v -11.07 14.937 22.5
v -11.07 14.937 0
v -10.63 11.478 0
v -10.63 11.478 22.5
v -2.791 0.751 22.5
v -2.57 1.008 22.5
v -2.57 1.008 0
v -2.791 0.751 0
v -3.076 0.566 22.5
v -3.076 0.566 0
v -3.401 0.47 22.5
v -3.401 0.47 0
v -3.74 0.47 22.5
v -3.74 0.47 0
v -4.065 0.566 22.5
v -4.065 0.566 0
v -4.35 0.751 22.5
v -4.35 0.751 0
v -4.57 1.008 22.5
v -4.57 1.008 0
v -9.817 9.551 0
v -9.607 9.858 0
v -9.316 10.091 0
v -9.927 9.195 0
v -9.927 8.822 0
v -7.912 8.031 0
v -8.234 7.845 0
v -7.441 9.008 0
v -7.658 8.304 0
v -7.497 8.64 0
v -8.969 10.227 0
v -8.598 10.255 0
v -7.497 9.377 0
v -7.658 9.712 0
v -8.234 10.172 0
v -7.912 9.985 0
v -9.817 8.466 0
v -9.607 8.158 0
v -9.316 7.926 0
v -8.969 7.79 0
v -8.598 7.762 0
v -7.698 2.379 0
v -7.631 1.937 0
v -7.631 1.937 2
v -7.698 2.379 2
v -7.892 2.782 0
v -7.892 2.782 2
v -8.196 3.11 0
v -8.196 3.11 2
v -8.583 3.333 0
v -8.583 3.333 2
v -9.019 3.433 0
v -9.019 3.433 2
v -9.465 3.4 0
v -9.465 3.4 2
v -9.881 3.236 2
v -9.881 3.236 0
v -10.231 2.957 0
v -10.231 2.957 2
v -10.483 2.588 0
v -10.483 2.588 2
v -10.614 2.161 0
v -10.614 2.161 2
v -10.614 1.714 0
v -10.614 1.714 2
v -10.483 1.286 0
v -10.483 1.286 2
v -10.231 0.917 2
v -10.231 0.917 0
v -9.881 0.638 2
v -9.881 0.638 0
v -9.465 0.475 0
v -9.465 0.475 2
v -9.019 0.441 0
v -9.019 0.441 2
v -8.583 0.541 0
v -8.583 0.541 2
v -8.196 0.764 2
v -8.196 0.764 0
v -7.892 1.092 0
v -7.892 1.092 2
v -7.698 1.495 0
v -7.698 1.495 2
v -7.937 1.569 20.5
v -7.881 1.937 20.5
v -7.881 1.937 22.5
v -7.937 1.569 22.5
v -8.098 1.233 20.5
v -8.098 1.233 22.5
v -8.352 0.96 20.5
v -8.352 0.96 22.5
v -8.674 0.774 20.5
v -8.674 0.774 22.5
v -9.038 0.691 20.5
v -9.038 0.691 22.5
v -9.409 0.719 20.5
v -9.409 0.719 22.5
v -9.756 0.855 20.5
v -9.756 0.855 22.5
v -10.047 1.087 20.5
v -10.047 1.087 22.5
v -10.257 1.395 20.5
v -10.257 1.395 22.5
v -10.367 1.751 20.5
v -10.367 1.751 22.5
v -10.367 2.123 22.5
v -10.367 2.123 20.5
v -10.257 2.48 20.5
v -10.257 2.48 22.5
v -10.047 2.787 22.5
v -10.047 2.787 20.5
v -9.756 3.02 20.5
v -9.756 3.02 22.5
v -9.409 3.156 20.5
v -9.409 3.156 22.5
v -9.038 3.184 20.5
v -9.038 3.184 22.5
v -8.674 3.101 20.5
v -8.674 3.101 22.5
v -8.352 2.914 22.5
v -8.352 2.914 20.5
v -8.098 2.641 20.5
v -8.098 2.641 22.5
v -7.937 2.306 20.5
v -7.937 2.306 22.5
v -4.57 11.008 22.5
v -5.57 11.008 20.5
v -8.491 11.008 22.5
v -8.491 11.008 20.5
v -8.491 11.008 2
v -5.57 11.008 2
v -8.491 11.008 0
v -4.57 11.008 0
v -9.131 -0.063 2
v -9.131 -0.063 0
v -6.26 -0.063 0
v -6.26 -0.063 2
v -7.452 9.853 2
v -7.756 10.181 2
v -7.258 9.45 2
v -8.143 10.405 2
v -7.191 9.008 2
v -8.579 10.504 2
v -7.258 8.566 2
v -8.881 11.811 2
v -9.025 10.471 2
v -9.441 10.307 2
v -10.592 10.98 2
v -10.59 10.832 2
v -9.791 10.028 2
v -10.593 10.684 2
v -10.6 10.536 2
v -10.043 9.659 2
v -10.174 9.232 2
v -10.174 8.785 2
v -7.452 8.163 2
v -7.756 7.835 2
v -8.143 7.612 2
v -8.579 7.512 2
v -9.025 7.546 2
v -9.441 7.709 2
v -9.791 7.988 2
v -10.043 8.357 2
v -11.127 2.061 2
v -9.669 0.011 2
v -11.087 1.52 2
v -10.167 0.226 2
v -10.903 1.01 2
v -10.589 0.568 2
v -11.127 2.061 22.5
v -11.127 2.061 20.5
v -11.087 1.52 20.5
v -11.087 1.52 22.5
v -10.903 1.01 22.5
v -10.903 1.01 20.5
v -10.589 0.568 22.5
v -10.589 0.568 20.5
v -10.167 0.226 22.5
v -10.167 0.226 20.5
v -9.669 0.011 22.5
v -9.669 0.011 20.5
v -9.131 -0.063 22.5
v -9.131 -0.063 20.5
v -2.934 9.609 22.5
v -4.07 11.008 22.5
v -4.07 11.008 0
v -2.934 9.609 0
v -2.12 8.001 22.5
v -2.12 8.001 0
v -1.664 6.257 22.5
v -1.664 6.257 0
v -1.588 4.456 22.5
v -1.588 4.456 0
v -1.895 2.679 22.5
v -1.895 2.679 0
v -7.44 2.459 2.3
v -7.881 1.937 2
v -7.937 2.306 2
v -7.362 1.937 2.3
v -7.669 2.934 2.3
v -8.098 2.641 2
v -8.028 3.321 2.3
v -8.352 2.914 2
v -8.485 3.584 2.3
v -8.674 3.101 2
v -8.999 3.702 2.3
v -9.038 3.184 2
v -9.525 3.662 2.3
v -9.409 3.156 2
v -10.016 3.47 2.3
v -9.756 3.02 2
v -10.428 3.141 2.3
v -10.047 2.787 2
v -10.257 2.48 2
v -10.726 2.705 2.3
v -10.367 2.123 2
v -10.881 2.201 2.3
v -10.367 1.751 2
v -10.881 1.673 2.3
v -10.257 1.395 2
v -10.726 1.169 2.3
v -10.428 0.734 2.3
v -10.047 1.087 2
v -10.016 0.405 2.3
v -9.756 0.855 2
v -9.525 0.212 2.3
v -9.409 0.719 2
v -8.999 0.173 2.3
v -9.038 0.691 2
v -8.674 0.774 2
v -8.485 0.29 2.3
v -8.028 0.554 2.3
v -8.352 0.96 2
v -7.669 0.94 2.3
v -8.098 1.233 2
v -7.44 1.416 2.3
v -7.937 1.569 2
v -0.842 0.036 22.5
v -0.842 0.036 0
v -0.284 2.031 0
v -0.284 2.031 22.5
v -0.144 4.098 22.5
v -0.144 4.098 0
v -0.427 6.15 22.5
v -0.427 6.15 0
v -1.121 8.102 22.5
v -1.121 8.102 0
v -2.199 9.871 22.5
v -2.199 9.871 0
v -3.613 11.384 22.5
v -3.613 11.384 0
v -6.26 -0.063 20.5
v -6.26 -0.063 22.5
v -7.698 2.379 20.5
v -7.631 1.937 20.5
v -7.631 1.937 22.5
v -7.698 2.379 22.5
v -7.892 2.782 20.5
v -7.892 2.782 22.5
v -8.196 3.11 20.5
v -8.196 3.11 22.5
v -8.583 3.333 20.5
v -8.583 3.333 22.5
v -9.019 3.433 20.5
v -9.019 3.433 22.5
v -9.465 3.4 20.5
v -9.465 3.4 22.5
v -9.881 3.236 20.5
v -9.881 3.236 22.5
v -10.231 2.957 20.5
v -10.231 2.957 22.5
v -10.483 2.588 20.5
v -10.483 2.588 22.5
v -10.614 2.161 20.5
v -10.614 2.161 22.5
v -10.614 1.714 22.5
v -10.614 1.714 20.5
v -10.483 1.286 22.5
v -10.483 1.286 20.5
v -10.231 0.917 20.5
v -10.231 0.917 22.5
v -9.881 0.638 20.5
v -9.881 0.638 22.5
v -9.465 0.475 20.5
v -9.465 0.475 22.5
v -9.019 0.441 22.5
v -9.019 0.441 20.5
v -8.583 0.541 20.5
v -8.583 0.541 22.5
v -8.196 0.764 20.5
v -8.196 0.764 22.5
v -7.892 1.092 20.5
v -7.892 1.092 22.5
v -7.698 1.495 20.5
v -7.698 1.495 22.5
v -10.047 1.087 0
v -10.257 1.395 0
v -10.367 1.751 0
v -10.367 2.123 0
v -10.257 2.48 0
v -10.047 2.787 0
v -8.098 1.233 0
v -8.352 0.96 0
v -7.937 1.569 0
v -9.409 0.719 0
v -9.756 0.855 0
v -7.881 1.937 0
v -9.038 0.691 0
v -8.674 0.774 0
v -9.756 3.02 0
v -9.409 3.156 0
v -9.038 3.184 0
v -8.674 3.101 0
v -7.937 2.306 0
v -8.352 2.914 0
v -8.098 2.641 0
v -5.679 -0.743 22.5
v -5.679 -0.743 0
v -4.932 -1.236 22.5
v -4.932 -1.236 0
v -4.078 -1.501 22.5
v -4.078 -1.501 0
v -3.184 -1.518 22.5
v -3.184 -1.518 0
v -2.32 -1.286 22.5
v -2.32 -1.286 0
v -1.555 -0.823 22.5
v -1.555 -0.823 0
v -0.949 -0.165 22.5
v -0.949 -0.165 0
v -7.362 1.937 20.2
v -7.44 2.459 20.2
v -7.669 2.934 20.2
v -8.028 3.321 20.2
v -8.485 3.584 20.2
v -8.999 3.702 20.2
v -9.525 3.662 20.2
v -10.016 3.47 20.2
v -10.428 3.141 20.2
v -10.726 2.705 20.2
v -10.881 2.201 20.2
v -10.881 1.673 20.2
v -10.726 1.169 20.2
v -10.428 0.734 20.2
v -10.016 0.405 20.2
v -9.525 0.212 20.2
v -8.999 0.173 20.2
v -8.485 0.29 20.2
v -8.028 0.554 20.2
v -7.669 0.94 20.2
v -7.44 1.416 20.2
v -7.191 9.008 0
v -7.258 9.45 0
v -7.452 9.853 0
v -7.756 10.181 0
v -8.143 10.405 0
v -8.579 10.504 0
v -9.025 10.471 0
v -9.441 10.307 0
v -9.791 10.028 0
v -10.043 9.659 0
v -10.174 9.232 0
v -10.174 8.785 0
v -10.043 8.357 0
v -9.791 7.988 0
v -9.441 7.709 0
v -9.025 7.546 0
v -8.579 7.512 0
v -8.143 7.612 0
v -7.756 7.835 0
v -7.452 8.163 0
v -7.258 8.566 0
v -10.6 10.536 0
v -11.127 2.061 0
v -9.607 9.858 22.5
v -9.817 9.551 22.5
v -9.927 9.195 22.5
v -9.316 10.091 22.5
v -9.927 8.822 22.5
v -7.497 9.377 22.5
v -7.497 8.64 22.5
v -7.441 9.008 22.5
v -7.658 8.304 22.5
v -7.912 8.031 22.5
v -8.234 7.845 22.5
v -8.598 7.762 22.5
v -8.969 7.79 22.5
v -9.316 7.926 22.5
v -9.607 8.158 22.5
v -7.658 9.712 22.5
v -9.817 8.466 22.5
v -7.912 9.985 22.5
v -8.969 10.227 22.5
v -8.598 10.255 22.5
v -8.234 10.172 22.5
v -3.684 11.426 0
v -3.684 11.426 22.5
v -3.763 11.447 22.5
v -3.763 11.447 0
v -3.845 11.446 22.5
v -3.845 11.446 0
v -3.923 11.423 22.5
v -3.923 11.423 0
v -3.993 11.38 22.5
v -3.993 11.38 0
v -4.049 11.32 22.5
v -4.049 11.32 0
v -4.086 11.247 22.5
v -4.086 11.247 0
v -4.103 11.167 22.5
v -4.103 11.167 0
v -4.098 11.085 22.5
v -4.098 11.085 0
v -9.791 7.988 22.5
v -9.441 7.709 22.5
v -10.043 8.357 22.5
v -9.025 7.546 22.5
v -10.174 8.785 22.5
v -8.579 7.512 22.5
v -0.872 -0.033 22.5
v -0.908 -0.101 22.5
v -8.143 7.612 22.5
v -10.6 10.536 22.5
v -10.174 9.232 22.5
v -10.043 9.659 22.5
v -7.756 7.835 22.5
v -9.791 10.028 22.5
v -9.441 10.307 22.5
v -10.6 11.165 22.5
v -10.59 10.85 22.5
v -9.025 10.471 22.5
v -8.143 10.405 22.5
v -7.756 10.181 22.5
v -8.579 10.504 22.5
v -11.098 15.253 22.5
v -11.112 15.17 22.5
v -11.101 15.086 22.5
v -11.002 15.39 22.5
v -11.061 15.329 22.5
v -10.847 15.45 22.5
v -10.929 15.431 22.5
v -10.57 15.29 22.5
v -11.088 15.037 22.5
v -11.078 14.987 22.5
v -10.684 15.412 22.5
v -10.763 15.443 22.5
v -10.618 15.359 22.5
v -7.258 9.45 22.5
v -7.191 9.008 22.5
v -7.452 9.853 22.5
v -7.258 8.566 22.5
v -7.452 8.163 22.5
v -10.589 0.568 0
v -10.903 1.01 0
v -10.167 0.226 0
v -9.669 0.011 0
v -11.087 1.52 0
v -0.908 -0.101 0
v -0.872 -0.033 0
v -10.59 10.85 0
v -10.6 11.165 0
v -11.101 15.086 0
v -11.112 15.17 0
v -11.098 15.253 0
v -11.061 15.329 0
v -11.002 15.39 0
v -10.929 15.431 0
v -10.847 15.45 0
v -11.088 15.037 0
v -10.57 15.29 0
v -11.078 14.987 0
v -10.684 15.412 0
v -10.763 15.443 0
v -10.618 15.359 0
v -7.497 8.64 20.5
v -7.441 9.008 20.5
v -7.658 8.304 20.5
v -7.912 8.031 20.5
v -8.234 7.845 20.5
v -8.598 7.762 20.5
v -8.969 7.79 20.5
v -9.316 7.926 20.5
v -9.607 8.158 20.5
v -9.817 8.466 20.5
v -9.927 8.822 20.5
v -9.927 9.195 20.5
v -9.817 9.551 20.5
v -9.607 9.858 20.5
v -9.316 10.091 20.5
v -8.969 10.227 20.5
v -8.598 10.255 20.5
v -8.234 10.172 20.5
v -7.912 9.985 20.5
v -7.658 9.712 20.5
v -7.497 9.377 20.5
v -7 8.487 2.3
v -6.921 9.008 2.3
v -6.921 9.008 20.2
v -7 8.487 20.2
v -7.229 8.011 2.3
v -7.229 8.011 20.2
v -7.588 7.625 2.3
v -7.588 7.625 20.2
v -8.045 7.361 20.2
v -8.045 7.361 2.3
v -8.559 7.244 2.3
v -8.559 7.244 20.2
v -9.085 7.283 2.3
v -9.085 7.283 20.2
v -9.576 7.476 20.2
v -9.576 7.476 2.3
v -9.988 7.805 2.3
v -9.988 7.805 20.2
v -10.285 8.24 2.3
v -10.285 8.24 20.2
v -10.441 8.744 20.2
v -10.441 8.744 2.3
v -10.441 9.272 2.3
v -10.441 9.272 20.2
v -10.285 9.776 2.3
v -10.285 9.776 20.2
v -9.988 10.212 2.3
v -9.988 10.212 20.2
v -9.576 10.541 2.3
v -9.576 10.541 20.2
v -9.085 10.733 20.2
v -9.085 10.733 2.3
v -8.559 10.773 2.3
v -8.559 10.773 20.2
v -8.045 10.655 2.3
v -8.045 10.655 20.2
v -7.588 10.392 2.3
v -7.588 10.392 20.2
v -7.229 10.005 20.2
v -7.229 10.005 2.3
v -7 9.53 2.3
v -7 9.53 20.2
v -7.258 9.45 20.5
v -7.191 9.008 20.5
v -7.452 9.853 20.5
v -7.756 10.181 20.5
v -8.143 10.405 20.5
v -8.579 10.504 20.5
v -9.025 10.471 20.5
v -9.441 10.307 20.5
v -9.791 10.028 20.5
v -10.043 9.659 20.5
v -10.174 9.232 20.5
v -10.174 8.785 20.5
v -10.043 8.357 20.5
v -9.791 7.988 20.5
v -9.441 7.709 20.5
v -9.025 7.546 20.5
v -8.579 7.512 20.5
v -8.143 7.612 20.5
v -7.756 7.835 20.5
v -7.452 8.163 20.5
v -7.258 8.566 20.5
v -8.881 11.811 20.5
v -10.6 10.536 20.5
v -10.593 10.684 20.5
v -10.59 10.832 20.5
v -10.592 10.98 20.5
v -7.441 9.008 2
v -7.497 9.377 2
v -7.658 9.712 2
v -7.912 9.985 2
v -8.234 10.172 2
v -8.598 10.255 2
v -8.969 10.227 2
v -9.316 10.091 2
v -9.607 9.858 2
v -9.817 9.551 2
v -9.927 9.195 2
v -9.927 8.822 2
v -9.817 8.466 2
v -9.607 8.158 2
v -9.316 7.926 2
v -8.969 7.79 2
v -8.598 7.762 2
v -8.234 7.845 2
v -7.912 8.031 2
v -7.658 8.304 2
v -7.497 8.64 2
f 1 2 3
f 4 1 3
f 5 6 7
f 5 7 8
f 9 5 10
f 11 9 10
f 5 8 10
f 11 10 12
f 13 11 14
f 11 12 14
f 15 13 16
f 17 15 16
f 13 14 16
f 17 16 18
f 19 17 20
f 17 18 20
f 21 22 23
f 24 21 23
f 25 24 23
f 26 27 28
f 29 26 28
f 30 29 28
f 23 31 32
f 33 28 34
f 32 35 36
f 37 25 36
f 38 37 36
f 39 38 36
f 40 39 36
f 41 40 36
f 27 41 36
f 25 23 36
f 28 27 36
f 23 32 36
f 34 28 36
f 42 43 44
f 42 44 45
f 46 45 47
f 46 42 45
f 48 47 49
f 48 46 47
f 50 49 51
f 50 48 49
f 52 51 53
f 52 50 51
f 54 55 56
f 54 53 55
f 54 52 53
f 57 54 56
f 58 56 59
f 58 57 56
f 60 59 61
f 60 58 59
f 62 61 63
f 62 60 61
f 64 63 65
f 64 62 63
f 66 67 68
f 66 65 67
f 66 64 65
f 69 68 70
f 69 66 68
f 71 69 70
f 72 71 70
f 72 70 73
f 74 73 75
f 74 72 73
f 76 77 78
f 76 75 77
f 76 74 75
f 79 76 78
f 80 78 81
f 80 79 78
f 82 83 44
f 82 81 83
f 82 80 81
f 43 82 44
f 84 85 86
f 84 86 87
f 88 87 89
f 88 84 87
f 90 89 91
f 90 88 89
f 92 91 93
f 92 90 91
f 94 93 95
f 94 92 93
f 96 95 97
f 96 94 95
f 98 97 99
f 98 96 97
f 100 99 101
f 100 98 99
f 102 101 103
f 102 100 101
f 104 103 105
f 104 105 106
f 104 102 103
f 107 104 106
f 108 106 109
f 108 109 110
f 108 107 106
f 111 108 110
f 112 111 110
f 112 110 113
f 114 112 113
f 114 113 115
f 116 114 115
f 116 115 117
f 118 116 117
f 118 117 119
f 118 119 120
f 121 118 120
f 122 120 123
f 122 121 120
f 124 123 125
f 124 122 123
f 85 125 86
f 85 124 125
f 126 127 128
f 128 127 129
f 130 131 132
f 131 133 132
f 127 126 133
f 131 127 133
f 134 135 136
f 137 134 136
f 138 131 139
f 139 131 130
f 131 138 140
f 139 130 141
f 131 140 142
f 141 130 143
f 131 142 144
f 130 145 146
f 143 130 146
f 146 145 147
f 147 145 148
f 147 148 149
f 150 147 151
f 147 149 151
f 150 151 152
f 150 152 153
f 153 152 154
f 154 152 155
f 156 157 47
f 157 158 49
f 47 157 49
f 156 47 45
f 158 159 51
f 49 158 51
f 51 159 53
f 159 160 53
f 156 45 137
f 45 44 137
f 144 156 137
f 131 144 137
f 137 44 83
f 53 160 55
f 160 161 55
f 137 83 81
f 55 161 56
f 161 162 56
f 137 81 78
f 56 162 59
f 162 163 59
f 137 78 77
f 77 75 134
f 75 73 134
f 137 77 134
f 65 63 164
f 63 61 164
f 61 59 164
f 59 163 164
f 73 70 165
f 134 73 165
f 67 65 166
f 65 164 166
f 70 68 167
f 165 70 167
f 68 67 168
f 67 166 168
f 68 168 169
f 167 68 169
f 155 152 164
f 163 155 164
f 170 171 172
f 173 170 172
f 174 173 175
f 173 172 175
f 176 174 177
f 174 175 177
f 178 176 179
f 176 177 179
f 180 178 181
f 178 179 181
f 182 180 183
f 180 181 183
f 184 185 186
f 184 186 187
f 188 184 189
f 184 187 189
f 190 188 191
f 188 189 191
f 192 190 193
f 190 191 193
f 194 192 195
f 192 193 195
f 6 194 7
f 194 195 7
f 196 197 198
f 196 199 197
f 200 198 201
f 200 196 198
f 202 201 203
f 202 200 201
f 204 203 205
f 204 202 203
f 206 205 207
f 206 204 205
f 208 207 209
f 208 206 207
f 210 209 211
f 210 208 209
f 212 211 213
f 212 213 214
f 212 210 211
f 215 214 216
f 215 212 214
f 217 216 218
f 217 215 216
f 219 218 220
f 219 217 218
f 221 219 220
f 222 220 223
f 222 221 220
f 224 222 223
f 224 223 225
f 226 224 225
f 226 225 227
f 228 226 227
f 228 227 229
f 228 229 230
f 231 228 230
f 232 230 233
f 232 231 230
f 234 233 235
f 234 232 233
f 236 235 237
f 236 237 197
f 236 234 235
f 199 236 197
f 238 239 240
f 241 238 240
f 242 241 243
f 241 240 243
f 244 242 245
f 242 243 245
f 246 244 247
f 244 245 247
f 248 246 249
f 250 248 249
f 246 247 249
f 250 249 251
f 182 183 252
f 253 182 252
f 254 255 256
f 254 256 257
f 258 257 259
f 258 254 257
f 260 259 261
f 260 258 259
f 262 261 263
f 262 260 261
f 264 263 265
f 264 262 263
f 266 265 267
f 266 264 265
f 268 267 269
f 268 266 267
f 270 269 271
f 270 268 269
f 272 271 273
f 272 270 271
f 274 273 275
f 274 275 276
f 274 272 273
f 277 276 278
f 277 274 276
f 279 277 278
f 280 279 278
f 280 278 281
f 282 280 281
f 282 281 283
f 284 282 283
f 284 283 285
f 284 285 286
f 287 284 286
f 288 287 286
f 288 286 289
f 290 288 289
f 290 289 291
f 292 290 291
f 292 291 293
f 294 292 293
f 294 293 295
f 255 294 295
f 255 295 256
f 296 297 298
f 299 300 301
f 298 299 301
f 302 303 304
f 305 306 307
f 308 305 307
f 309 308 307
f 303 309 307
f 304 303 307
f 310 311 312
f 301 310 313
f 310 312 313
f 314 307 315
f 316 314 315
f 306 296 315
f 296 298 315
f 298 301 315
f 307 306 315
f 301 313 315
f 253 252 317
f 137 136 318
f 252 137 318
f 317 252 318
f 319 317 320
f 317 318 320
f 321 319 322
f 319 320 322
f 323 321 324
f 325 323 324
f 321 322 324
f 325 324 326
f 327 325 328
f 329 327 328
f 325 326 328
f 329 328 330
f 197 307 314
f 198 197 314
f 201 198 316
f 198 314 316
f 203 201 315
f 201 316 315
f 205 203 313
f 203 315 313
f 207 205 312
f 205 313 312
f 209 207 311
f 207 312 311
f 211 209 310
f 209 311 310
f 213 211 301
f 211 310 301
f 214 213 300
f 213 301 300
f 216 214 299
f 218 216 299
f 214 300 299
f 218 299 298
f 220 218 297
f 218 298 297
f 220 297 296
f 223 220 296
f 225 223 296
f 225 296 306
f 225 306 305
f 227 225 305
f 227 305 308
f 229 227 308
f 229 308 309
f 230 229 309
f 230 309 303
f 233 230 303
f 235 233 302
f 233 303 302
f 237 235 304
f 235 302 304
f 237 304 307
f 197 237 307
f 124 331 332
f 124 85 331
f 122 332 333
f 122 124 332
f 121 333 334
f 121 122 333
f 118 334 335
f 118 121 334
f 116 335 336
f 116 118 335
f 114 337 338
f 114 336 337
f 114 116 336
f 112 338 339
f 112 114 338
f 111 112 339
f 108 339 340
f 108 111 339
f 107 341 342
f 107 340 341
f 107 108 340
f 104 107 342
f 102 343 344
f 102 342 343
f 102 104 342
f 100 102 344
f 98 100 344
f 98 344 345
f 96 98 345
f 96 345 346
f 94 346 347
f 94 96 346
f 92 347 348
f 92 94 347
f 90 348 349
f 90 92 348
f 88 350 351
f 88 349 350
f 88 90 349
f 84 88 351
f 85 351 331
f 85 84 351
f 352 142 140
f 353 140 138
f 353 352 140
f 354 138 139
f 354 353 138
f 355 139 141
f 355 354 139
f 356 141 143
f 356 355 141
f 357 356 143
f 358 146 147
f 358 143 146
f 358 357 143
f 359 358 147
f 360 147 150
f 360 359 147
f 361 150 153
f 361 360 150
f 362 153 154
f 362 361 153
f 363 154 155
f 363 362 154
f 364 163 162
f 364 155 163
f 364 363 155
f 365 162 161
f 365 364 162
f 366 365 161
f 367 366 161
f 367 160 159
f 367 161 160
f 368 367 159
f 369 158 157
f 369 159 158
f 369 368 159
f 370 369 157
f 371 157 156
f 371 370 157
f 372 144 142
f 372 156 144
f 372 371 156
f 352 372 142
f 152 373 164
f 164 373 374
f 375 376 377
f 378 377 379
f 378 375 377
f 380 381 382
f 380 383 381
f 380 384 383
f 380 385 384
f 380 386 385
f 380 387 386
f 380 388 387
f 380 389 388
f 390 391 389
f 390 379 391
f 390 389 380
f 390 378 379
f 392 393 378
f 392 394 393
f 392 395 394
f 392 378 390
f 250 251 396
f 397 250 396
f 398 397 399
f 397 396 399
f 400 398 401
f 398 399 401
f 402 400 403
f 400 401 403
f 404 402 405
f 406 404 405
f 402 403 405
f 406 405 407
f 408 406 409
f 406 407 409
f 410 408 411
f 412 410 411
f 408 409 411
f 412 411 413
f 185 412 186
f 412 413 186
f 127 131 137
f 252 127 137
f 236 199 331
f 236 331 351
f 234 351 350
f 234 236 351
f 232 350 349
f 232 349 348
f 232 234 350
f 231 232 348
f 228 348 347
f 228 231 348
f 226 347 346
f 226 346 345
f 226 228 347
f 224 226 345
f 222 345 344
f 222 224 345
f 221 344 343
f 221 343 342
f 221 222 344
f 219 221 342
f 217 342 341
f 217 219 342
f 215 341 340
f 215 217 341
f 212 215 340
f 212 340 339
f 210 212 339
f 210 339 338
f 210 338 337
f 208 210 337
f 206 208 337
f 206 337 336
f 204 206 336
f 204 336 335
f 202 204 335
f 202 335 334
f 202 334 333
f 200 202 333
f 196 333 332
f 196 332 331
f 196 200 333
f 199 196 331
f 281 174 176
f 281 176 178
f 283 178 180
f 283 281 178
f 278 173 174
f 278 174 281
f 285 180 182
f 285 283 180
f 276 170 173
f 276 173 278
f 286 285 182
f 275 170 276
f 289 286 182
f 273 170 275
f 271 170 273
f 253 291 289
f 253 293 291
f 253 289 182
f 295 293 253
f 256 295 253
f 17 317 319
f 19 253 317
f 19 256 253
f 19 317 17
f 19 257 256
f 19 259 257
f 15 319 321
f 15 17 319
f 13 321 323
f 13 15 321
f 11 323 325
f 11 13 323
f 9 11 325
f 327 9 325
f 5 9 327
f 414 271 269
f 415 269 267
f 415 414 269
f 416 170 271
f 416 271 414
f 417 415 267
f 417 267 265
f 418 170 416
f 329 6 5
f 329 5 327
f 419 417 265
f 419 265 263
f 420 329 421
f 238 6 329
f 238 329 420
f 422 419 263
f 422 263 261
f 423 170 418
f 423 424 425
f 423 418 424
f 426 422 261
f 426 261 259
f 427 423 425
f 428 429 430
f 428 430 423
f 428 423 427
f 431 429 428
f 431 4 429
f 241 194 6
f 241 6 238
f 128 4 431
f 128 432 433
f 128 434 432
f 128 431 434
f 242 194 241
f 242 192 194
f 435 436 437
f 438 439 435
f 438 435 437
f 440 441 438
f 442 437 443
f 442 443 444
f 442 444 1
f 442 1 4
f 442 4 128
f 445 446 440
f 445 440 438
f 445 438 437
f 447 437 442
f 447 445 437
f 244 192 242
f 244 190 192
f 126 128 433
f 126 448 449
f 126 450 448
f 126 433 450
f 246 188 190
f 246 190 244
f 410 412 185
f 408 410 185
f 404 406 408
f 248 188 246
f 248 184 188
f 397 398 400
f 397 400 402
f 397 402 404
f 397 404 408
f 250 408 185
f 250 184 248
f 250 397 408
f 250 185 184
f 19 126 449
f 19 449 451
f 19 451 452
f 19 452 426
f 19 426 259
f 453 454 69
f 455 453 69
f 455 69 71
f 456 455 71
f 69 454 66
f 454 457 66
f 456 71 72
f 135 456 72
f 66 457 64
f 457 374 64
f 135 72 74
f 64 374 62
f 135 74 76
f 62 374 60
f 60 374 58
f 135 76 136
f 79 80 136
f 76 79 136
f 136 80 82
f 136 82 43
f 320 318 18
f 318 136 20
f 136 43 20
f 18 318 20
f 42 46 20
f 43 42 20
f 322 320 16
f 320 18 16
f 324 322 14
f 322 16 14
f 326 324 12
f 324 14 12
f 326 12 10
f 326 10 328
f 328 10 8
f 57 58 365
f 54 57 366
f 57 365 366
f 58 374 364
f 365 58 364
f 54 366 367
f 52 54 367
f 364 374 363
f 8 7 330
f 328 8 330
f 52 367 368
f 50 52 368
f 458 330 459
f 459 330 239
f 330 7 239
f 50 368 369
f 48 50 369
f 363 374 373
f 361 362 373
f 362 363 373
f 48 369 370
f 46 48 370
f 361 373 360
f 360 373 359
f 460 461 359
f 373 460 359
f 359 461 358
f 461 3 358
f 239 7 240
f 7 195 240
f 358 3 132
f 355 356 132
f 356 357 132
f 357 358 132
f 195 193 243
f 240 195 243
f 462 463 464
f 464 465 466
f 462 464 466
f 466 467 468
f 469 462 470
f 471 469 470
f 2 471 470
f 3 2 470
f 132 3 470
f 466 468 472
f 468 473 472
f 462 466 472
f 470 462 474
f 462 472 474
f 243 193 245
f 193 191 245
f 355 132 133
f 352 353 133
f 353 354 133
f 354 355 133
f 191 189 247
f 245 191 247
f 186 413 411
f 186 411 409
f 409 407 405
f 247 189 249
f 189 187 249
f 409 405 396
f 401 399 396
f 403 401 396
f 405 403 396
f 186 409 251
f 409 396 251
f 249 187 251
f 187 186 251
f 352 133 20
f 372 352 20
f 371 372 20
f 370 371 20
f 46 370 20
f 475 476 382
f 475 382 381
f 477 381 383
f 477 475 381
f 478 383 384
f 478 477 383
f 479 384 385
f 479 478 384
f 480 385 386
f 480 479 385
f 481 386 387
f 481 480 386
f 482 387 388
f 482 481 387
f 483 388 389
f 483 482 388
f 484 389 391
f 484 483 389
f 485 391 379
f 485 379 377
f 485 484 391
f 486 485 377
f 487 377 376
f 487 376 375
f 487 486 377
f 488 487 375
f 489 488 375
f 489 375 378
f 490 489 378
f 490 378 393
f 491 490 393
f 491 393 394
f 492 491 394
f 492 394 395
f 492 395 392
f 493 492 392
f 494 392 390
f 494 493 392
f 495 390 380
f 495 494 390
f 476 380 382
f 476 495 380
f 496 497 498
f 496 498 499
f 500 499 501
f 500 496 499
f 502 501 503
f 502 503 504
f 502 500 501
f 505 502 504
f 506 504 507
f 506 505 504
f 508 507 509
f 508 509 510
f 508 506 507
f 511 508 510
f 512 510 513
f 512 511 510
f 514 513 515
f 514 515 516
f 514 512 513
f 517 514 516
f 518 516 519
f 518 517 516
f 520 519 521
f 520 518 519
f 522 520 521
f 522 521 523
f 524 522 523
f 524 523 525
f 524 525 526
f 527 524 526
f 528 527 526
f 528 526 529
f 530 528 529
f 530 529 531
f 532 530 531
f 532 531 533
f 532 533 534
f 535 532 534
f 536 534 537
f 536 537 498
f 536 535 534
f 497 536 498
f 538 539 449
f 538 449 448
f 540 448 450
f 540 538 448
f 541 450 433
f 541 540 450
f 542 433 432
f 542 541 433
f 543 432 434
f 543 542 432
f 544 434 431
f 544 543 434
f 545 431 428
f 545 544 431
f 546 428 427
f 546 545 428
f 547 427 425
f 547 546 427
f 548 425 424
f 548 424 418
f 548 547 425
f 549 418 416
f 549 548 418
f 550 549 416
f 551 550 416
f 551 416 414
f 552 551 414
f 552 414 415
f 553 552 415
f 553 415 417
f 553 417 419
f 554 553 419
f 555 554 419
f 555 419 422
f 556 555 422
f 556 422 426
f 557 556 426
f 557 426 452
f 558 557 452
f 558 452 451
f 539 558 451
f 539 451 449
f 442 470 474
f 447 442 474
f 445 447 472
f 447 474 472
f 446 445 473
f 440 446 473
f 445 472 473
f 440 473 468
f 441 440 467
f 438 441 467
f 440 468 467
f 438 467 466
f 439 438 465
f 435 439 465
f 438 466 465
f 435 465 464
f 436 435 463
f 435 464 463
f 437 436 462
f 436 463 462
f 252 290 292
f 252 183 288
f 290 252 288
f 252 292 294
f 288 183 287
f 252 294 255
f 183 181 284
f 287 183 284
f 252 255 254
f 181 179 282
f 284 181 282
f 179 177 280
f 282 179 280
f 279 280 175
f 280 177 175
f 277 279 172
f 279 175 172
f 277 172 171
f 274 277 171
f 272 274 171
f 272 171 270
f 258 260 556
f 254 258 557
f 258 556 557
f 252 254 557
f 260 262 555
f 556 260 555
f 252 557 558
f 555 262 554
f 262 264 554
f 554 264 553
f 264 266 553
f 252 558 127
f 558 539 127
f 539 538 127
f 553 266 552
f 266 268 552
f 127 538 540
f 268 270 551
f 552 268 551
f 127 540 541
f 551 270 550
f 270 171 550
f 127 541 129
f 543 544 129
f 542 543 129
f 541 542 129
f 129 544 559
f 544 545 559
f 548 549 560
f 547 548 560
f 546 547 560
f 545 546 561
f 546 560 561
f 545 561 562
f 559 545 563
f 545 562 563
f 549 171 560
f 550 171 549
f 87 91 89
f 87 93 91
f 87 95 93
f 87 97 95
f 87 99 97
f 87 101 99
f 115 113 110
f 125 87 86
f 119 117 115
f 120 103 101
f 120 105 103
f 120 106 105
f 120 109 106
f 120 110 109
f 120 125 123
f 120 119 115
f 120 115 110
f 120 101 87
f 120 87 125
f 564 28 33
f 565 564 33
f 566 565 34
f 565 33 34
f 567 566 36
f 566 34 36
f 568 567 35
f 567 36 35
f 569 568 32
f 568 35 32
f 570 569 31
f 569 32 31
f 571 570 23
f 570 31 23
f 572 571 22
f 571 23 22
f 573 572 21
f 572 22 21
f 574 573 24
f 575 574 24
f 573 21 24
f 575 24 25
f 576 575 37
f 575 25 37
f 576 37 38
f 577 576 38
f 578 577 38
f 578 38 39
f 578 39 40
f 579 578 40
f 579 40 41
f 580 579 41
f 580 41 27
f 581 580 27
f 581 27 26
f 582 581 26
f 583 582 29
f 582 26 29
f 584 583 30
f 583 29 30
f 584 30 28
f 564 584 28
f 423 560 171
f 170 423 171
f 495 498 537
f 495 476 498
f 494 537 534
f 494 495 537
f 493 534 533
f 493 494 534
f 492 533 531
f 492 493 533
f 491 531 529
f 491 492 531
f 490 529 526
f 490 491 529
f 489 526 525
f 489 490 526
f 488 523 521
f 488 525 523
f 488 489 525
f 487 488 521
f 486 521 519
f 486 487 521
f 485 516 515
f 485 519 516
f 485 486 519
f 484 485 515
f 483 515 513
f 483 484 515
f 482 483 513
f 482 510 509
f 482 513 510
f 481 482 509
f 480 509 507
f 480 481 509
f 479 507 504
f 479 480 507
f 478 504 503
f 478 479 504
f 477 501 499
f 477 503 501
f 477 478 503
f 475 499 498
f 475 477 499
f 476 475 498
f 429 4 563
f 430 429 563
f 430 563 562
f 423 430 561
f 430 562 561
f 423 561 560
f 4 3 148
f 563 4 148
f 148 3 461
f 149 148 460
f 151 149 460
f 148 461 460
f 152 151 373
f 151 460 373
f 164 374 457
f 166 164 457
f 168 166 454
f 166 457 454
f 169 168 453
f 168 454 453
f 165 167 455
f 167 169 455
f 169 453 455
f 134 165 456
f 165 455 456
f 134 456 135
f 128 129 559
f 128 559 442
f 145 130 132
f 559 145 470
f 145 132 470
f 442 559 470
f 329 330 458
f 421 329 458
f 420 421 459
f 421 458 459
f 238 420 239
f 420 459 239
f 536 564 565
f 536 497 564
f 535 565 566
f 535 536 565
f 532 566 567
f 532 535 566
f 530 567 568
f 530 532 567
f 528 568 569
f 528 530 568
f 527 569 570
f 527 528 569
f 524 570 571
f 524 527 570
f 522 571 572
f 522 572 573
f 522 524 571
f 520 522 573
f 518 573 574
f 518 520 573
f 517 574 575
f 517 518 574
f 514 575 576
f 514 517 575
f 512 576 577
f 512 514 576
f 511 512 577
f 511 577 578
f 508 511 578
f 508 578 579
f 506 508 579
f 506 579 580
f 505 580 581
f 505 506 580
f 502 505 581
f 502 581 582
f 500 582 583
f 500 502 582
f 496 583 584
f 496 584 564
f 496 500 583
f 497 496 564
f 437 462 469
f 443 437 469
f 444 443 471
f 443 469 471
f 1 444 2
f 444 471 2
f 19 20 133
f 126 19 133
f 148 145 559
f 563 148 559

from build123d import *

# Parameters (mm, degrees)
F0_R      = 1.5
F1_DEPTH  = 22.5
F2_W      = 1.5649868256
F2_H      = 18.5
F2_W_2    = 8.4908823588
F2_H_2    = 2
F2_W_3    = 4.0411260356
F3_DEPTH  = 25
F4_DEPTH  = 22.5
F5_DEPTH  = 2
F0_R_2    = 1.25
F5_FACE_R = 1.25
F6_DEPTH  = 0.3
F6_TAPER  = -60
F7_DEPTH  = 17.9
F7_FACE_R = 1.7696152423
F8_DEPTH  = 0.3
F8_TAPER  = 60
F9_DEPTH  = 2
F10_W     = 0.8927135028
F10_H     = 18.5
F11_DEPTH = 25


with BuildPart() as f1:
    # F0 (on Top) → F1 (new body)
    with BuildSketch(Plane.XY):
        with BuildLine():
            Line((-6.2595093475, -0.0628177289), (-5.5704498465, 11.0081995456))
            Line((-5.5704498465, 11.0081995456), (-8.4908092394, 11.0081995456))
            ThreePointArc((-8.4908092394, 11.0081995456), (-9.5714450422, 10.8886817815), (-10.599845389, 10.5359057038))
            Line((-10.599845389, 10.5359057038), (-11.1272968, 2.0614217526))
            ThreePointArc((-11.1272968, 2.0614217526), (-10.5886364868, 0.5675982034), (-9.1311593921, -0.0628177289))
            Line((-9.1311593921, -0.0628177289), (-6.2595093475, -0.0628177289))
        make_face()
        with Locations((-9.1311593921, 1.9371822711)):
            Circle(F0_R, mode=Mode.SUBTRACT)
        with Locations((-8.6910596692, 9.0081995456)):
            Circle(F0_R, mode=Mode.SUBTRACT)
    extrude(amount=F1_DEPTH)

    # F2 (on face) → F3 (cut)
    with BuildSketch(Plane(origin=(-11.2121657678, 0.6978445754, 0), x_dir=(-0.0621197408, -0.998068704, 0), z_dir=(-0.998068704, 0.0621197408, 0))):
        with Locations((-10.6395915159, 11.25)):
            Rectangle(F2_W, F2_H)
        with Locations((-5.6116569237, 11.25)):
            Rectangle(F2_W_2, F2_H)
        with Locations((-5.6116569237, 1)):
            Rectangle(F2_W_2, F2_H_2)
        with Locations((0.6543472735, 11.25)):
            Rectangle(F2_W_3, F2_H)
    extrude(amount=-F3_DEPTH, mode=Mode.SUBTRACT)

    # F0 (on Top) → F4 (join)
    with BuildSketch(Plane.XY):
        with BuildLine():
            ThreePointArc((-10.599845389, 10.5359057038), (-9.5714450422, 10.8886817815), (-8.4908092394, 11.0081995456))
            Line((-8.4908092394, 11.0081995456), (-10.5704498465, 15.2896977961))
            ThreePointArc((-10.5704498465, 15.2896977961), (-10.9289981735, 15.4314206404), (-11.1011234826, 15.0864349228))
            ThreePointArc((-11.1011234826, 15.0864349228), (-11.0828716583, 15.0122379619), (-11.0703382822, 14.9368640104))
            Line((-11.0703382822, 14.9368640104), (-10.6301798393, 11.4776224879))
            ThreePointArc((-10.6301798393, 11.4776224879), (-10.5927809018, 11.0074802207), (-10.599845389, 10.5359057038))
        make_face()
        with BuildLine():
            Line((-4.5704498465, 1.0081995456), (-4.5704498465, 11.0081995456))
            Line((-4.5704498465, 11.0081995456), (-5.5704498465, 11.0081995456))
            Line((-5.5704498465, 11.0081995456), (-6.2595093475, -0.0628177289))
            ThreePointArc((-6.2595093475, -0.0628177289), (-3.6316461386, -1.5412123224), (-0.9489071219, -0.1649031322))
            ThreePointArc((-0.9489071219, -0.1649031322), (-0.8895758539, -0.0673518323), (-0.8417512995, 0.0363268419))
            ThreePointArc((-0.8417512995, 0.0363268419), (-0.4268119196, 6.1501192436), (-3.6132824607, 11.3843372092))
            ThreePointArc((-3.6132824607, 11.3843372092), (-3.9931483806, 11.3801406851), (-4.0704498465, 11.0081995456))
            ThreePointArc((-4.0704498465, 11.0081995456), (-1.6641453193, 6.2566452246), (-2.5704498465, 1.0081995456))
            ThreePointArc((-2.5704498465, 1.0081995456), (-3.5704498465, 0.4581995456), (-4.5704498465, 1.0081995456))
        make_face()
    extrude(amount=F4_DEPTH)

    # F0 (on Top) → F5 (join)
    with BuildSketch(Plane.XY):
        with BuildLine():
            Line((-6.2595093475, -0.0628177289), (-5.5704498465, 11.0081995456))
            Line((-5.5704498465, 11.0081995456), (-8.4908092394, 11.0081995456))
            ThreePointArc((-8.4908092394, 11.0081995456), (-9.5714450422, 10.8886817815), (-10.599845389, 10.5359057038))
            Line((-10.599845389, 10.5359057038), (-11.1272968, 2.0614217526))
            ThreePointArc((-11.1272968, 2.0614217526), (-10.5886364868, 0.5675982034), (-9.1311593921, -0.0628177289))
            Line((-9.1311593921, -0.0628177289), (-6.2595093475, -0.0628177289))
        make_face()
        with Locations((-9.1311593921, 1.9371822711)):
            Circle(F0_R, mode=Mode.SUBTRACT)
        with Locations((-8.6910596692, 9.0081995456)):
            Circle(F0_R, mode=Mode.SUBTRACT)
    extrude(amount=F5_DEPTH)

    # F10 (on face) → F11 (cut)
    with BuildSketch(Plane(origin=(-2.5436906285, -1.235539994, 0), x_dir=(-0.4369134382, 0.8995035561, 0), z_dir=(0.8995035561, 0.4369134382, 0))):
        with Locations((14.0580200475, 11.25)):
            Rectangle(F10_W, F10_H)
    extrude(amount=-F11_DEPTH, mode=Mode.SUBTRACT)


with BuildPart() as f5:
    # F0 (on Top) → F5, piece 2 (new body)
    with BuildSketch(Plane.XY):
        with Locations((-9.1311593921, 1.9371822711)):
            Circle(F0_R_2)
    extrude(amount=F5_DEPTH)

    # F5_face (on face) → F6, piece 2 (join)
    with BuildSketch(Plane(origin=(-8.6910596692, 9.0081995456, 2), x_dir=(1, 0, 0), z_dir=(0, 0, 1))):
        with Locations((-0.4400997229, -7.0710172745)):
            Circle(F5_FACE_R)
    extrude(amount=F6_DEPTH, taper=F6_TAPER)

    # F7#2 (add): a face of the model
    f7_2_faces = [f5.faces().sort_by_distance(p)[0] for p in [
        (-9.1311593921, 1.9371822711, 2.3),
    ]]
    extrude(f7_2_faces, amount=F7_DEPTH)

    # F7_face (on face) → F8, piece 2 (join)
    with BuildSketch(Plane(origin=(-8.6910596692, 9.0081995456, 20.2), x_dir=(1, 0, 0), z_dir=(0, 0, 1))):
        with Locations((-0.4400997229, -7.0710172745)):
            Circle(F7_FACE_R)
    extrude(amount=F8_DEPTH, taper=F8_TAPER)

    # F9#2 (add): a face of the model
    f9_2_faces = [f5.faces().sort_by_distance(p)[0] for p in [
        (-9.1311593921, 1.9371822711, 20.5),
    ]]
    extrude(f9_2_faces, amount=F9_DEPTH)


with BuildPart() as f5b:
    # F0 (on Top) → F5, piece 3 (new body)
    with BuildSketch(Plane.XY):
        with Locations((-8.6910596692, 9.0081995456)):
            Circle(F0_R_2)
    extrude(amount=F5_DEPTH)

    # F5_face (on face) → F6 (join)
    with BuildSketch(Plane(origin=(-8.6910596692, 9.0081995456, 2), x_dir=(1, 0, 0), z_dir=(0, 0, 1))):
        Circle(F5_FACE_R)
    extrude(amount=F6_DEPTH, taper=F6_TAPER)

    # F7 (add): a face of the model
    f7_faces = [f5b.faces().sort_by_distance(p)[0] for p in [
        (-8.6910596692, 9.0081995456, 2.3),
    ]]
    extrude(f7_faces, amount=F7_DEPTH)

    # F7_face (on face) → F8 (join)
    with BuildSketch(Plane(origin=(-8.6910596692, 9.0081995456, 20.2), x_dir=(1, 0, 0), z_dir=(0, 0, 1))):
        Circle(F7_FACE_R)
    extrude(amount=F8_DEPTH, taper=F8_TAPER)

    # F9 (add): a face of the model
    f9_faces = [f5b.faces().sort_by_distance(p)[0] for p in [
        (-8.6910596692, 9.0081995456, 20.5),
    ]]
    extrude(f9_faces, amount=F9_DEPTH)


solid = Compound([f1.part, f5.part, f5b.part])
